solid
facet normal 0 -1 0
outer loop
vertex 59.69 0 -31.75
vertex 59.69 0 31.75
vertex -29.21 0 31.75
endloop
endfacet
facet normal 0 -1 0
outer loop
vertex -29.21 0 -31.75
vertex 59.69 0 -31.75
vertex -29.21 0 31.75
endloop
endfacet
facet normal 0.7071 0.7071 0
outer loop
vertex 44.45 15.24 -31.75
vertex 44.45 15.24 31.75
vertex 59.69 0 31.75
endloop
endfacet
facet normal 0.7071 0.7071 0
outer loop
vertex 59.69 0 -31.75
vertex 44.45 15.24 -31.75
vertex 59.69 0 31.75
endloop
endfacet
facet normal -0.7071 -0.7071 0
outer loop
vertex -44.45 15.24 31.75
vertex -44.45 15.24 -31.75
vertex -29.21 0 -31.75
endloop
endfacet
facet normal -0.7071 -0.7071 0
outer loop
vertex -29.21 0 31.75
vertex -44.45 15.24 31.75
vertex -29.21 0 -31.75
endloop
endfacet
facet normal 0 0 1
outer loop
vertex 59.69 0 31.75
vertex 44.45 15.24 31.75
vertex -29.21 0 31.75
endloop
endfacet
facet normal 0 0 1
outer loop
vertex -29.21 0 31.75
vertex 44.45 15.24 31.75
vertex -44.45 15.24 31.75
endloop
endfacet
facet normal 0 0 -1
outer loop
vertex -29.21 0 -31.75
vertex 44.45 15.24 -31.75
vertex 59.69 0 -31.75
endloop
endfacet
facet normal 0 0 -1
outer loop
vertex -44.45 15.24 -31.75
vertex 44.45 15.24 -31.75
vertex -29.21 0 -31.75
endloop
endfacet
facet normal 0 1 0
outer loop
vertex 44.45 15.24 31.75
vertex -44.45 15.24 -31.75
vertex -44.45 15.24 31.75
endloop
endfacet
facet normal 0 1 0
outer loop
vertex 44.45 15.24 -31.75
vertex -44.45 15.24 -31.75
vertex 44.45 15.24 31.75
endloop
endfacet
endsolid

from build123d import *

# Parameters (mm, degrees)
SKETCH1_W           = 88.9
SKETCH1_H           = 63.5
BOSS_EXTRUDE1_DEPTH = 15.24
BOSS_EXTRUDE2_DEPTH = 63.5
CUT_EXTRUDE1_DEPTH  = 63.5


with BuildPart() as part:
    # Sketch1 → Boss-Extrude1 (new body)
    with BuildSketch(Plane(origin=(0, 0, 0), x_dir=(1, 0, 0), z_dir=(0, 1, 0))):
        Rectangle(SKETCH1_W, SKETCH1_H)
    extrude(amount=BOSS_EXTRUDE1_DEPTH)

    # Sketch2 → Boss-Extrude2 (add)
    with BuildSketch(Plane.XY.offset(31.75)):
        Polygon((44.45, 15.24), (59.69, 0), (44.45, 0), align=None)
    extrude(amount=-BOSS_EXTRUDE2_DEPTH)

    # Sketch3 → Cut-Extrude1 (cut)
    with BuildSketch(Plane(origin=(0, 0, -31.75), x_dir=(-1, 0, 0), z_dir=(0, 0, -1))):
        Polygon((44.45, 15.24), (29.21, 0), (44.45, 0), align=None)
    extrude(amount=-CUT_EXTRUDE1_DEPTH, mode=Mode.SUBTRACT)


solid = part.part
